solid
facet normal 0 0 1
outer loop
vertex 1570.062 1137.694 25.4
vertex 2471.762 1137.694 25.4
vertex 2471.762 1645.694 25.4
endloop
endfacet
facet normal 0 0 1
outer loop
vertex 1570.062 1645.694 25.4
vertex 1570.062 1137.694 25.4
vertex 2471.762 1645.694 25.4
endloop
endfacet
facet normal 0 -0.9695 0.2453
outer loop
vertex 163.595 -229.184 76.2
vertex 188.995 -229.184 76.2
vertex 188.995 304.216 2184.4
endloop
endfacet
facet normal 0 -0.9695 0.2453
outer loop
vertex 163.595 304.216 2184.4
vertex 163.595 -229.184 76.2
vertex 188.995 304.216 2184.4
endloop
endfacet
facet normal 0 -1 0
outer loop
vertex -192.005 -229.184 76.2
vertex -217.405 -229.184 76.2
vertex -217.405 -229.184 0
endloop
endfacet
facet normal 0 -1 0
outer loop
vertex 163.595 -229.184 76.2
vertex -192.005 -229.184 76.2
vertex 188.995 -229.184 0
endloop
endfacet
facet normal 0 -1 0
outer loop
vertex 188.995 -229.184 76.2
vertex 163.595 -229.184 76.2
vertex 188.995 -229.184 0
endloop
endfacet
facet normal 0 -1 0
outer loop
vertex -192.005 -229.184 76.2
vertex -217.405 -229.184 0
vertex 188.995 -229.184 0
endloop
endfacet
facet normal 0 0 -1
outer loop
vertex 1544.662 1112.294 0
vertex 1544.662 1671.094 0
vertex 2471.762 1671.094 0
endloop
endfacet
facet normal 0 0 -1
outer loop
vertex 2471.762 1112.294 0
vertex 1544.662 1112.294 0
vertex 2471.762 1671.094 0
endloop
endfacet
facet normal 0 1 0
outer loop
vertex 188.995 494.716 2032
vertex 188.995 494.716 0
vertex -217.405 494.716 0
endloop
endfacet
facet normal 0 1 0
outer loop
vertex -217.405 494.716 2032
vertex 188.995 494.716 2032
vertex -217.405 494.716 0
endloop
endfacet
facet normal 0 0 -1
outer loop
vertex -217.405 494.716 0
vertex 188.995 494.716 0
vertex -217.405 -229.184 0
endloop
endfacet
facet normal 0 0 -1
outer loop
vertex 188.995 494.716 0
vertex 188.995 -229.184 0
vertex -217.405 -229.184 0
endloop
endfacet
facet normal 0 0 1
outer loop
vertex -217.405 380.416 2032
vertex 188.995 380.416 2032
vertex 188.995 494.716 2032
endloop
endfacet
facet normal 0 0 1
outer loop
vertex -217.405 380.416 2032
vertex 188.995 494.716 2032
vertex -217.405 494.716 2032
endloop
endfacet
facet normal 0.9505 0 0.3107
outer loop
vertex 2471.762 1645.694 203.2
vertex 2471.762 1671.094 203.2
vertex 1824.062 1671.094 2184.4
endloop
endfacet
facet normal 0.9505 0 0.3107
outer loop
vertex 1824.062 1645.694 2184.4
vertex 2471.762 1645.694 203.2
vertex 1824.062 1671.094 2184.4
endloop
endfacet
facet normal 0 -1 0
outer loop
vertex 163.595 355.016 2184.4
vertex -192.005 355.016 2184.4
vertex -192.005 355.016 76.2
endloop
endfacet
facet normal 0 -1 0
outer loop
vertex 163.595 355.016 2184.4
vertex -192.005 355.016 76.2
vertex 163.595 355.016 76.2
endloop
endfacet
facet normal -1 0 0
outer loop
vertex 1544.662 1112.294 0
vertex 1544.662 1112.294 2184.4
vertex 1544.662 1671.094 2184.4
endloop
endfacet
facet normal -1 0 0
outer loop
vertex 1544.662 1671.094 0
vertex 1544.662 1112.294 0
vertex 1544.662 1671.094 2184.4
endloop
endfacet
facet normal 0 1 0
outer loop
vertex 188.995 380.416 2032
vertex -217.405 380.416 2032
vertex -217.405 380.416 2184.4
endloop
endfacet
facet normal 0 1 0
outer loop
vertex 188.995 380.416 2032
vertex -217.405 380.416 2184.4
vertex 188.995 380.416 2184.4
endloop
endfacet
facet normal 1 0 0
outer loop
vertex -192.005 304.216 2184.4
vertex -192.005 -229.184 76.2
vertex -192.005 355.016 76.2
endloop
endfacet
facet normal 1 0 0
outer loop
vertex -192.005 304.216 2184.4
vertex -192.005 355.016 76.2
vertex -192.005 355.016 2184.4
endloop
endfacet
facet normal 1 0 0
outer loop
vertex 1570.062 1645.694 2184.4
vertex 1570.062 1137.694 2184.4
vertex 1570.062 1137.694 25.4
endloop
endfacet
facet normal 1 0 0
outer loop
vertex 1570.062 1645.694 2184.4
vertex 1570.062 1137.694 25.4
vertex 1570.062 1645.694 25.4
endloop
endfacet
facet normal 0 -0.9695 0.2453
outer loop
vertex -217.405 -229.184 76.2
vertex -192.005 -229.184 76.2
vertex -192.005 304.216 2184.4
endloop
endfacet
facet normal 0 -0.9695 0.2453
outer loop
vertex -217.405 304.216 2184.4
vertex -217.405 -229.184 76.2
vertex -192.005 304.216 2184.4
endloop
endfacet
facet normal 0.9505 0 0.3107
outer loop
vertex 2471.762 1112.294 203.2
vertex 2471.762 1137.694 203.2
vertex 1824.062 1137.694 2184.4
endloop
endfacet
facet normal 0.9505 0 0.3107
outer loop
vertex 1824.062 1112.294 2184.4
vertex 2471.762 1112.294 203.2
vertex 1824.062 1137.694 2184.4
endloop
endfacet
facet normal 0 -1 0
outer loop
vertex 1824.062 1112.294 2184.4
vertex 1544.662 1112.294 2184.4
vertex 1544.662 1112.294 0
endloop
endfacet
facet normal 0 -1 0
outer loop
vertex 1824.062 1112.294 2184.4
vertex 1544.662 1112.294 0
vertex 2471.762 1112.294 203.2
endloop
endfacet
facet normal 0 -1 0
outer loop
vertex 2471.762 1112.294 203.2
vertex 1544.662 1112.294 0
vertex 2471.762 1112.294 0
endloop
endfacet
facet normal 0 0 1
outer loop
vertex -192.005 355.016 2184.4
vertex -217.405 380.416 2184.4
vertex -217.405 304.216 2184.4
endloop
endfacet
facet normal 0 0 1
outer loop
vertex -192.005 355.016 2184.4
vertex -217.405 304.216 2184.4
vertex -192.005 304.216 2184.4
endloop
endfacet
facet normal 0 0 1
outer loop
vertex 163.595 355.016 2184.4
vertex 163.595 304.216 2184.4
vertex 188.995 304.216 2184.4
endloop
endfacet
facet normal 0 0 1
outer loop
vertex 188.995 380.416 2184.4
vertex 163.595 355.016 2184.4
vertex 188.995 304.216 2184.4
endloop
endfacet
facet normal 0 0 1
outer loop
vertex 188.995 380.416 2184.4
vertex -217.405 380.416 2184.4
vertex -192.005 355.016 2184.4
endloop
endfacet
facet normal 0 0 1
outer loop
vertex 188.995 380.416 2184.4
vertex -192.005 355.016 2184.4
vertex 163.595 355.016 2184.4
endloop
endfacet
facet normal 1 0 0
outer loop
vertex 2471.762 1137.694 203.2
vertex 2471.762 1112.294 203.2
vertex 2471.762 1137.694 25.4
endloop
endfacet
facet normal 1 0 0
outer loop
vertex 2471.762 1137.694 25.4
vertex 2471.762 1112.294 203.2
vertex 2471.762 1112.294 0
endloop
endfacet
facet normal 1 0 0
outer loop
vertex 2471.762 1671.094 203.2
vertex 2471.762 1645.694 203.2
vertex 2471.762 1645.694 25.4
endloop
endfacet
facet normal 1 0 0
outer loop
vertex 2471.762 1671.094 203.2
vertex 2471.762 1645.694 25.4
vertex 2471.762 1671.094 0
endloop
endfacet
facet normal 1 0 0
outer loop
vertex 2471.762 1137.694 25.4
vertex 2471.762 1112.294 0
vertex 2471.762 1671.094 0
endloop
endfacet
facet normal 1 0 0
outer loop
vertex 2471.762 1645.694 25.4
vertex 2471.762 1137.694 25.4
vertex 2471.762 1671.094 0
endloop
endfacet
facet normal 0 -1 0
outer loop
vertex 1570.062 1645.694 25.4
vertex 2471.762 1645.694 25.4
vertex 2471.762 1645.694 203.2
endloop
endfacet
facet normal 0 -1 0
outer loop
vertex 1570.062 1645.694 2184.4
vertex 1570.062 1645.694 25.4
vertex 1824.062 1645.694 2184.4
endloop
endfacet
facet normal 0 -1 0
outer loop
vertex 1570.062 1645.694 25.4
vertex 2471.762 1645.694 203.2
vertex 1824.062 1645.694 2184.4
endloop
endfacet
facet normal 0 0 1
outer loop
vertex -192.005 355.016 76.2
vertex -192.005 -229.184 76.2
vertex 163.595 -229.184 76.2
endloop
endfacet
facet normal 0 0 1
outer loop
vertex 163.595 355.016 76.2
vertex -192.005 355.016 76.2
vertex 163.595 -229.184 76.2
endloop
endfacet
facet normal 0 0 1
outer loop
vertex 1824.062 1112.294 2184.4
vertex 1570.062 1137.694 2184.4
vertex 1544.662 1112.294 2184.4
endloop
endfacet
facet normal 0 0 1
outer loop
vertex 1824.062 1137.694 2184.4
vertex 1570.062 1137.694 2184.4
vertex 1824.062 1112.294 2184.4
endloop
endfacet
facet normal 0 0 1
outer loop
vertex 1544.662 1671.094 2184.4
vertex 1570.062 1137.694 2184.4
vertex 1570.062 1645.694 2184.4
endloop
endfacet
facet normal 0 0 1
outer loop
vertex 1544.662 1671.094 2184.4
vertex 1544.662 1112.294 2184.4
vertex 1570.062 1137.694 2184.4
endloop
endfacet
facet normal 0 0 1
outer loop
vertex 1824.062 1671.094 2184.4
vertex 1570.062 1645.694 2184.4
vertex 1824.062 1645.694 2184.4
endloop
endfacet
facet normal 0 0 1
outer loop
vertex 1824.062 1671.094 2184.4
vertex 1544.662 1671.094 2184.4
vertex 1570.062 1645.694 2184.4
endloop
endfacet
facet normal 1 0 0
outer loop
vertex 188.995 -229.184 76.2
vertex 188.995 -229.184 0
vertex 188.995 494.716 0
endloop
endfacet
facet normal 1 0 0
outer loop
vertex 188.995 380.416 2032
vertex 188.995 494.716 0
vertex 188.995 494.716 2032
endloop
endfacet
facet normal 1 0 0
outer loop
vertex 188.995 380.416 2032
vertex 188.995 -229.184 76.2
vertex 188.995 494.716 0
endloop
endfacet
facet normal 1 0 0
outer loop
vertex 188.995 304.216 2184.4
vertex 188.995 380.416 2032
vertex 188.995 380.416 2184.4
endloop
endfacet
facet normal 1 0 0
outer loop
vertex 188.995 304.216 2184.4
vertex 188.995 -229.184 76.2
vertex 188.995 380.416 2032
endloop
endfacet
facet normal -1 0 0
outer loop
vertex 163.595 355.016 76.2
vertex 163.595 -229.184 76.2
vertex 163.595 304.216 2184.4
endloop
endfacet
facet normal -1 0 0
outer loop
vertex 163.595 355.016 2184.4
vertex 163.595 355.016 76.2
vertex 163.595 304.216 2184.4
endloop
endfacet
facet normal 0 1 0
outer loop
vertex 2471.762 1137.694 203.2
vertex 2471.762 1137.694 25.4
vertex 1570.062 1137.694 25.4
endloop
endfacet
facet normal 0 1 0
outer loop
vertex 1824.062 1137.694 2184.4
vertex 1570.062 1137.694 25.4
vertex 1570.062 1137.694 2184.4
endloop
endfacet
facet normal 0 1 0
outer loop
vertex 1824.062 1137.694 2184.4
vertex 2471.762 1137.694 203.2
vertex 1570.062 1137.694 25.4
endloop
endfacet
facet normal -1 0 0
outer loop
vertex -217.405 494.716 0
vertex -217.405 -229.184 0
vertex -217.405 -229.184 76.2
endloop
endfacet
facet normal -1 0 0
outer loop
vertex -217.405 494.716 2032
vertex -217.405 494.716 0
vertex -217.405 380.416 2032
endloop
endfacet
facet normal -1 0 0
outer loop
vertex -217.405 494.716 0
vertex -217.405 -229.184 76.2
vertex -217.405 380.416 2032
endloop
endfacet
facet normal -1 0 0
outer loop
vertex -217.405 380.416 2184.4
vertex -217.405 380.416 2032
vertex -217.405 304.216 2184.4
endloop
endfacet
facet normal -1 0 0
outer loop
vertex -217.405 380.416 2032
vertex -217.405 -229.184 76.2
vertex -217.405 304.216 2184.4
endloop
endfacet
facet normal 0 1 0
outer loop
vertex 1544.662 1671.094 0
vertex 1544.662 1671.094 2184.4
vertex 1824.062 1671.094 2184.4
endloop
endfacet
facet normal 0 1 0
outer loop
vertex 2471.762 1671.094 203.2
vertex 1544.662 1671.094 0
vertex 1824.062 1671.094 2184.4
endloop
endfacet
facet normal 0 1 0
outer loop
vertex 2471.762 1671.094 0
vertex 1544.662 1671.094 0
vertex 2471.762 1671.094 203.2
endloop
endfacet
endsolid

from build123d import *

# Parameters (mm, degrees)
F0_W      = 406.4
F0_H      = 609.6
F1_DEPTH  = 2184.4
F3_W      = 355.6
F3_H      = 2108.2
F4_DEPTH  = 584.2
F5_DEPTH  = 406.4
F6_W      = 406.4
F6_H      = 2032
F7_DEPTH  = 114.3
F8_W      = 927.1
F8_H      = 558.8
F9_DEPTH  = 2184.4
F10_W     = 508
F10_H     = 2159
F11_DEPTH = 901.7
F13_DEPTH = 558.8


with BuildPart() as f1:
    # F0 (on Top) → F1 (new body)
    with BuildSketch(Plane.XY):
        with Locations((-14.205011, 75.616049)):
            Rectangle(F0_W, F0_H)
    extrude(amount=F1_DEPTH)

    # F3 (on face) → F4 (cut)
    with BuildSketch(Plane.XZ.offset(229.183951)):
        with Locations((-14.205011, 1130.3)):
            Rectangle(F3_W, F3_H)
    extrude(amount=-F4_DEPTH, mode=Mode.SUBTRACT)

    # F2 (on face) → F5 (cut)
    with BuildSketch(Plane.YZ.offset(188.994989)):
        Polygon((-229.183951, 2184.4), (-229.183951, 76.2), (304.216049, 2184.4), align=None)
    extrude(amount=-F5_DEPTH, mode=Mode.SUBTRACT)

    # F6 (on face) → F7 (join)
    with BuildSketch(Plane(origin=(0, 380.416049, 0), x_dir=(-1, 0, 0), z_dir=(0, 1, 0))):
        with Locations((14.205011, 1016)):
            Rectangle(F6_W, F6_H)
    extrude(amount=F7_DEPTH)


with BuildPart() as f9:
    # F8 (on Top) → F9 (new body)
    with BuildSketch(Plane.XY):
        with Locations((2008.211802, 1391.693504)):
            Rectangle(F8_W, F8_H)
    extrude(amount=F9_DEPTH)

    # F10 (on face) → F11 (cut)
    with BuildSketch(Plane.YZ.offset(2471.761802)):
        with Locations((1391.693504, 1104.9)):
            Rectangle(F10_W, F10_H)
    extrude(amount=-F11_DEPTH, mode=Mode.SUBTRACT)

    # F12 (on face) → F13 (cut)
    with BuildSketch(Plane(origin=(0, 1671.093504, 0), x_dir=(-1, 0, 0), z_dir=(0, 1, 0))):
        Polygon((-2471.761802, 2184.4), (-2471.761802, 203.2), (-1824.061802, 2184.4), align=None)
    extrude(amount=-F13_DEPTH, mode=Mode.SUBTRACT)


solid = Compound([f1.part, f9.part])
